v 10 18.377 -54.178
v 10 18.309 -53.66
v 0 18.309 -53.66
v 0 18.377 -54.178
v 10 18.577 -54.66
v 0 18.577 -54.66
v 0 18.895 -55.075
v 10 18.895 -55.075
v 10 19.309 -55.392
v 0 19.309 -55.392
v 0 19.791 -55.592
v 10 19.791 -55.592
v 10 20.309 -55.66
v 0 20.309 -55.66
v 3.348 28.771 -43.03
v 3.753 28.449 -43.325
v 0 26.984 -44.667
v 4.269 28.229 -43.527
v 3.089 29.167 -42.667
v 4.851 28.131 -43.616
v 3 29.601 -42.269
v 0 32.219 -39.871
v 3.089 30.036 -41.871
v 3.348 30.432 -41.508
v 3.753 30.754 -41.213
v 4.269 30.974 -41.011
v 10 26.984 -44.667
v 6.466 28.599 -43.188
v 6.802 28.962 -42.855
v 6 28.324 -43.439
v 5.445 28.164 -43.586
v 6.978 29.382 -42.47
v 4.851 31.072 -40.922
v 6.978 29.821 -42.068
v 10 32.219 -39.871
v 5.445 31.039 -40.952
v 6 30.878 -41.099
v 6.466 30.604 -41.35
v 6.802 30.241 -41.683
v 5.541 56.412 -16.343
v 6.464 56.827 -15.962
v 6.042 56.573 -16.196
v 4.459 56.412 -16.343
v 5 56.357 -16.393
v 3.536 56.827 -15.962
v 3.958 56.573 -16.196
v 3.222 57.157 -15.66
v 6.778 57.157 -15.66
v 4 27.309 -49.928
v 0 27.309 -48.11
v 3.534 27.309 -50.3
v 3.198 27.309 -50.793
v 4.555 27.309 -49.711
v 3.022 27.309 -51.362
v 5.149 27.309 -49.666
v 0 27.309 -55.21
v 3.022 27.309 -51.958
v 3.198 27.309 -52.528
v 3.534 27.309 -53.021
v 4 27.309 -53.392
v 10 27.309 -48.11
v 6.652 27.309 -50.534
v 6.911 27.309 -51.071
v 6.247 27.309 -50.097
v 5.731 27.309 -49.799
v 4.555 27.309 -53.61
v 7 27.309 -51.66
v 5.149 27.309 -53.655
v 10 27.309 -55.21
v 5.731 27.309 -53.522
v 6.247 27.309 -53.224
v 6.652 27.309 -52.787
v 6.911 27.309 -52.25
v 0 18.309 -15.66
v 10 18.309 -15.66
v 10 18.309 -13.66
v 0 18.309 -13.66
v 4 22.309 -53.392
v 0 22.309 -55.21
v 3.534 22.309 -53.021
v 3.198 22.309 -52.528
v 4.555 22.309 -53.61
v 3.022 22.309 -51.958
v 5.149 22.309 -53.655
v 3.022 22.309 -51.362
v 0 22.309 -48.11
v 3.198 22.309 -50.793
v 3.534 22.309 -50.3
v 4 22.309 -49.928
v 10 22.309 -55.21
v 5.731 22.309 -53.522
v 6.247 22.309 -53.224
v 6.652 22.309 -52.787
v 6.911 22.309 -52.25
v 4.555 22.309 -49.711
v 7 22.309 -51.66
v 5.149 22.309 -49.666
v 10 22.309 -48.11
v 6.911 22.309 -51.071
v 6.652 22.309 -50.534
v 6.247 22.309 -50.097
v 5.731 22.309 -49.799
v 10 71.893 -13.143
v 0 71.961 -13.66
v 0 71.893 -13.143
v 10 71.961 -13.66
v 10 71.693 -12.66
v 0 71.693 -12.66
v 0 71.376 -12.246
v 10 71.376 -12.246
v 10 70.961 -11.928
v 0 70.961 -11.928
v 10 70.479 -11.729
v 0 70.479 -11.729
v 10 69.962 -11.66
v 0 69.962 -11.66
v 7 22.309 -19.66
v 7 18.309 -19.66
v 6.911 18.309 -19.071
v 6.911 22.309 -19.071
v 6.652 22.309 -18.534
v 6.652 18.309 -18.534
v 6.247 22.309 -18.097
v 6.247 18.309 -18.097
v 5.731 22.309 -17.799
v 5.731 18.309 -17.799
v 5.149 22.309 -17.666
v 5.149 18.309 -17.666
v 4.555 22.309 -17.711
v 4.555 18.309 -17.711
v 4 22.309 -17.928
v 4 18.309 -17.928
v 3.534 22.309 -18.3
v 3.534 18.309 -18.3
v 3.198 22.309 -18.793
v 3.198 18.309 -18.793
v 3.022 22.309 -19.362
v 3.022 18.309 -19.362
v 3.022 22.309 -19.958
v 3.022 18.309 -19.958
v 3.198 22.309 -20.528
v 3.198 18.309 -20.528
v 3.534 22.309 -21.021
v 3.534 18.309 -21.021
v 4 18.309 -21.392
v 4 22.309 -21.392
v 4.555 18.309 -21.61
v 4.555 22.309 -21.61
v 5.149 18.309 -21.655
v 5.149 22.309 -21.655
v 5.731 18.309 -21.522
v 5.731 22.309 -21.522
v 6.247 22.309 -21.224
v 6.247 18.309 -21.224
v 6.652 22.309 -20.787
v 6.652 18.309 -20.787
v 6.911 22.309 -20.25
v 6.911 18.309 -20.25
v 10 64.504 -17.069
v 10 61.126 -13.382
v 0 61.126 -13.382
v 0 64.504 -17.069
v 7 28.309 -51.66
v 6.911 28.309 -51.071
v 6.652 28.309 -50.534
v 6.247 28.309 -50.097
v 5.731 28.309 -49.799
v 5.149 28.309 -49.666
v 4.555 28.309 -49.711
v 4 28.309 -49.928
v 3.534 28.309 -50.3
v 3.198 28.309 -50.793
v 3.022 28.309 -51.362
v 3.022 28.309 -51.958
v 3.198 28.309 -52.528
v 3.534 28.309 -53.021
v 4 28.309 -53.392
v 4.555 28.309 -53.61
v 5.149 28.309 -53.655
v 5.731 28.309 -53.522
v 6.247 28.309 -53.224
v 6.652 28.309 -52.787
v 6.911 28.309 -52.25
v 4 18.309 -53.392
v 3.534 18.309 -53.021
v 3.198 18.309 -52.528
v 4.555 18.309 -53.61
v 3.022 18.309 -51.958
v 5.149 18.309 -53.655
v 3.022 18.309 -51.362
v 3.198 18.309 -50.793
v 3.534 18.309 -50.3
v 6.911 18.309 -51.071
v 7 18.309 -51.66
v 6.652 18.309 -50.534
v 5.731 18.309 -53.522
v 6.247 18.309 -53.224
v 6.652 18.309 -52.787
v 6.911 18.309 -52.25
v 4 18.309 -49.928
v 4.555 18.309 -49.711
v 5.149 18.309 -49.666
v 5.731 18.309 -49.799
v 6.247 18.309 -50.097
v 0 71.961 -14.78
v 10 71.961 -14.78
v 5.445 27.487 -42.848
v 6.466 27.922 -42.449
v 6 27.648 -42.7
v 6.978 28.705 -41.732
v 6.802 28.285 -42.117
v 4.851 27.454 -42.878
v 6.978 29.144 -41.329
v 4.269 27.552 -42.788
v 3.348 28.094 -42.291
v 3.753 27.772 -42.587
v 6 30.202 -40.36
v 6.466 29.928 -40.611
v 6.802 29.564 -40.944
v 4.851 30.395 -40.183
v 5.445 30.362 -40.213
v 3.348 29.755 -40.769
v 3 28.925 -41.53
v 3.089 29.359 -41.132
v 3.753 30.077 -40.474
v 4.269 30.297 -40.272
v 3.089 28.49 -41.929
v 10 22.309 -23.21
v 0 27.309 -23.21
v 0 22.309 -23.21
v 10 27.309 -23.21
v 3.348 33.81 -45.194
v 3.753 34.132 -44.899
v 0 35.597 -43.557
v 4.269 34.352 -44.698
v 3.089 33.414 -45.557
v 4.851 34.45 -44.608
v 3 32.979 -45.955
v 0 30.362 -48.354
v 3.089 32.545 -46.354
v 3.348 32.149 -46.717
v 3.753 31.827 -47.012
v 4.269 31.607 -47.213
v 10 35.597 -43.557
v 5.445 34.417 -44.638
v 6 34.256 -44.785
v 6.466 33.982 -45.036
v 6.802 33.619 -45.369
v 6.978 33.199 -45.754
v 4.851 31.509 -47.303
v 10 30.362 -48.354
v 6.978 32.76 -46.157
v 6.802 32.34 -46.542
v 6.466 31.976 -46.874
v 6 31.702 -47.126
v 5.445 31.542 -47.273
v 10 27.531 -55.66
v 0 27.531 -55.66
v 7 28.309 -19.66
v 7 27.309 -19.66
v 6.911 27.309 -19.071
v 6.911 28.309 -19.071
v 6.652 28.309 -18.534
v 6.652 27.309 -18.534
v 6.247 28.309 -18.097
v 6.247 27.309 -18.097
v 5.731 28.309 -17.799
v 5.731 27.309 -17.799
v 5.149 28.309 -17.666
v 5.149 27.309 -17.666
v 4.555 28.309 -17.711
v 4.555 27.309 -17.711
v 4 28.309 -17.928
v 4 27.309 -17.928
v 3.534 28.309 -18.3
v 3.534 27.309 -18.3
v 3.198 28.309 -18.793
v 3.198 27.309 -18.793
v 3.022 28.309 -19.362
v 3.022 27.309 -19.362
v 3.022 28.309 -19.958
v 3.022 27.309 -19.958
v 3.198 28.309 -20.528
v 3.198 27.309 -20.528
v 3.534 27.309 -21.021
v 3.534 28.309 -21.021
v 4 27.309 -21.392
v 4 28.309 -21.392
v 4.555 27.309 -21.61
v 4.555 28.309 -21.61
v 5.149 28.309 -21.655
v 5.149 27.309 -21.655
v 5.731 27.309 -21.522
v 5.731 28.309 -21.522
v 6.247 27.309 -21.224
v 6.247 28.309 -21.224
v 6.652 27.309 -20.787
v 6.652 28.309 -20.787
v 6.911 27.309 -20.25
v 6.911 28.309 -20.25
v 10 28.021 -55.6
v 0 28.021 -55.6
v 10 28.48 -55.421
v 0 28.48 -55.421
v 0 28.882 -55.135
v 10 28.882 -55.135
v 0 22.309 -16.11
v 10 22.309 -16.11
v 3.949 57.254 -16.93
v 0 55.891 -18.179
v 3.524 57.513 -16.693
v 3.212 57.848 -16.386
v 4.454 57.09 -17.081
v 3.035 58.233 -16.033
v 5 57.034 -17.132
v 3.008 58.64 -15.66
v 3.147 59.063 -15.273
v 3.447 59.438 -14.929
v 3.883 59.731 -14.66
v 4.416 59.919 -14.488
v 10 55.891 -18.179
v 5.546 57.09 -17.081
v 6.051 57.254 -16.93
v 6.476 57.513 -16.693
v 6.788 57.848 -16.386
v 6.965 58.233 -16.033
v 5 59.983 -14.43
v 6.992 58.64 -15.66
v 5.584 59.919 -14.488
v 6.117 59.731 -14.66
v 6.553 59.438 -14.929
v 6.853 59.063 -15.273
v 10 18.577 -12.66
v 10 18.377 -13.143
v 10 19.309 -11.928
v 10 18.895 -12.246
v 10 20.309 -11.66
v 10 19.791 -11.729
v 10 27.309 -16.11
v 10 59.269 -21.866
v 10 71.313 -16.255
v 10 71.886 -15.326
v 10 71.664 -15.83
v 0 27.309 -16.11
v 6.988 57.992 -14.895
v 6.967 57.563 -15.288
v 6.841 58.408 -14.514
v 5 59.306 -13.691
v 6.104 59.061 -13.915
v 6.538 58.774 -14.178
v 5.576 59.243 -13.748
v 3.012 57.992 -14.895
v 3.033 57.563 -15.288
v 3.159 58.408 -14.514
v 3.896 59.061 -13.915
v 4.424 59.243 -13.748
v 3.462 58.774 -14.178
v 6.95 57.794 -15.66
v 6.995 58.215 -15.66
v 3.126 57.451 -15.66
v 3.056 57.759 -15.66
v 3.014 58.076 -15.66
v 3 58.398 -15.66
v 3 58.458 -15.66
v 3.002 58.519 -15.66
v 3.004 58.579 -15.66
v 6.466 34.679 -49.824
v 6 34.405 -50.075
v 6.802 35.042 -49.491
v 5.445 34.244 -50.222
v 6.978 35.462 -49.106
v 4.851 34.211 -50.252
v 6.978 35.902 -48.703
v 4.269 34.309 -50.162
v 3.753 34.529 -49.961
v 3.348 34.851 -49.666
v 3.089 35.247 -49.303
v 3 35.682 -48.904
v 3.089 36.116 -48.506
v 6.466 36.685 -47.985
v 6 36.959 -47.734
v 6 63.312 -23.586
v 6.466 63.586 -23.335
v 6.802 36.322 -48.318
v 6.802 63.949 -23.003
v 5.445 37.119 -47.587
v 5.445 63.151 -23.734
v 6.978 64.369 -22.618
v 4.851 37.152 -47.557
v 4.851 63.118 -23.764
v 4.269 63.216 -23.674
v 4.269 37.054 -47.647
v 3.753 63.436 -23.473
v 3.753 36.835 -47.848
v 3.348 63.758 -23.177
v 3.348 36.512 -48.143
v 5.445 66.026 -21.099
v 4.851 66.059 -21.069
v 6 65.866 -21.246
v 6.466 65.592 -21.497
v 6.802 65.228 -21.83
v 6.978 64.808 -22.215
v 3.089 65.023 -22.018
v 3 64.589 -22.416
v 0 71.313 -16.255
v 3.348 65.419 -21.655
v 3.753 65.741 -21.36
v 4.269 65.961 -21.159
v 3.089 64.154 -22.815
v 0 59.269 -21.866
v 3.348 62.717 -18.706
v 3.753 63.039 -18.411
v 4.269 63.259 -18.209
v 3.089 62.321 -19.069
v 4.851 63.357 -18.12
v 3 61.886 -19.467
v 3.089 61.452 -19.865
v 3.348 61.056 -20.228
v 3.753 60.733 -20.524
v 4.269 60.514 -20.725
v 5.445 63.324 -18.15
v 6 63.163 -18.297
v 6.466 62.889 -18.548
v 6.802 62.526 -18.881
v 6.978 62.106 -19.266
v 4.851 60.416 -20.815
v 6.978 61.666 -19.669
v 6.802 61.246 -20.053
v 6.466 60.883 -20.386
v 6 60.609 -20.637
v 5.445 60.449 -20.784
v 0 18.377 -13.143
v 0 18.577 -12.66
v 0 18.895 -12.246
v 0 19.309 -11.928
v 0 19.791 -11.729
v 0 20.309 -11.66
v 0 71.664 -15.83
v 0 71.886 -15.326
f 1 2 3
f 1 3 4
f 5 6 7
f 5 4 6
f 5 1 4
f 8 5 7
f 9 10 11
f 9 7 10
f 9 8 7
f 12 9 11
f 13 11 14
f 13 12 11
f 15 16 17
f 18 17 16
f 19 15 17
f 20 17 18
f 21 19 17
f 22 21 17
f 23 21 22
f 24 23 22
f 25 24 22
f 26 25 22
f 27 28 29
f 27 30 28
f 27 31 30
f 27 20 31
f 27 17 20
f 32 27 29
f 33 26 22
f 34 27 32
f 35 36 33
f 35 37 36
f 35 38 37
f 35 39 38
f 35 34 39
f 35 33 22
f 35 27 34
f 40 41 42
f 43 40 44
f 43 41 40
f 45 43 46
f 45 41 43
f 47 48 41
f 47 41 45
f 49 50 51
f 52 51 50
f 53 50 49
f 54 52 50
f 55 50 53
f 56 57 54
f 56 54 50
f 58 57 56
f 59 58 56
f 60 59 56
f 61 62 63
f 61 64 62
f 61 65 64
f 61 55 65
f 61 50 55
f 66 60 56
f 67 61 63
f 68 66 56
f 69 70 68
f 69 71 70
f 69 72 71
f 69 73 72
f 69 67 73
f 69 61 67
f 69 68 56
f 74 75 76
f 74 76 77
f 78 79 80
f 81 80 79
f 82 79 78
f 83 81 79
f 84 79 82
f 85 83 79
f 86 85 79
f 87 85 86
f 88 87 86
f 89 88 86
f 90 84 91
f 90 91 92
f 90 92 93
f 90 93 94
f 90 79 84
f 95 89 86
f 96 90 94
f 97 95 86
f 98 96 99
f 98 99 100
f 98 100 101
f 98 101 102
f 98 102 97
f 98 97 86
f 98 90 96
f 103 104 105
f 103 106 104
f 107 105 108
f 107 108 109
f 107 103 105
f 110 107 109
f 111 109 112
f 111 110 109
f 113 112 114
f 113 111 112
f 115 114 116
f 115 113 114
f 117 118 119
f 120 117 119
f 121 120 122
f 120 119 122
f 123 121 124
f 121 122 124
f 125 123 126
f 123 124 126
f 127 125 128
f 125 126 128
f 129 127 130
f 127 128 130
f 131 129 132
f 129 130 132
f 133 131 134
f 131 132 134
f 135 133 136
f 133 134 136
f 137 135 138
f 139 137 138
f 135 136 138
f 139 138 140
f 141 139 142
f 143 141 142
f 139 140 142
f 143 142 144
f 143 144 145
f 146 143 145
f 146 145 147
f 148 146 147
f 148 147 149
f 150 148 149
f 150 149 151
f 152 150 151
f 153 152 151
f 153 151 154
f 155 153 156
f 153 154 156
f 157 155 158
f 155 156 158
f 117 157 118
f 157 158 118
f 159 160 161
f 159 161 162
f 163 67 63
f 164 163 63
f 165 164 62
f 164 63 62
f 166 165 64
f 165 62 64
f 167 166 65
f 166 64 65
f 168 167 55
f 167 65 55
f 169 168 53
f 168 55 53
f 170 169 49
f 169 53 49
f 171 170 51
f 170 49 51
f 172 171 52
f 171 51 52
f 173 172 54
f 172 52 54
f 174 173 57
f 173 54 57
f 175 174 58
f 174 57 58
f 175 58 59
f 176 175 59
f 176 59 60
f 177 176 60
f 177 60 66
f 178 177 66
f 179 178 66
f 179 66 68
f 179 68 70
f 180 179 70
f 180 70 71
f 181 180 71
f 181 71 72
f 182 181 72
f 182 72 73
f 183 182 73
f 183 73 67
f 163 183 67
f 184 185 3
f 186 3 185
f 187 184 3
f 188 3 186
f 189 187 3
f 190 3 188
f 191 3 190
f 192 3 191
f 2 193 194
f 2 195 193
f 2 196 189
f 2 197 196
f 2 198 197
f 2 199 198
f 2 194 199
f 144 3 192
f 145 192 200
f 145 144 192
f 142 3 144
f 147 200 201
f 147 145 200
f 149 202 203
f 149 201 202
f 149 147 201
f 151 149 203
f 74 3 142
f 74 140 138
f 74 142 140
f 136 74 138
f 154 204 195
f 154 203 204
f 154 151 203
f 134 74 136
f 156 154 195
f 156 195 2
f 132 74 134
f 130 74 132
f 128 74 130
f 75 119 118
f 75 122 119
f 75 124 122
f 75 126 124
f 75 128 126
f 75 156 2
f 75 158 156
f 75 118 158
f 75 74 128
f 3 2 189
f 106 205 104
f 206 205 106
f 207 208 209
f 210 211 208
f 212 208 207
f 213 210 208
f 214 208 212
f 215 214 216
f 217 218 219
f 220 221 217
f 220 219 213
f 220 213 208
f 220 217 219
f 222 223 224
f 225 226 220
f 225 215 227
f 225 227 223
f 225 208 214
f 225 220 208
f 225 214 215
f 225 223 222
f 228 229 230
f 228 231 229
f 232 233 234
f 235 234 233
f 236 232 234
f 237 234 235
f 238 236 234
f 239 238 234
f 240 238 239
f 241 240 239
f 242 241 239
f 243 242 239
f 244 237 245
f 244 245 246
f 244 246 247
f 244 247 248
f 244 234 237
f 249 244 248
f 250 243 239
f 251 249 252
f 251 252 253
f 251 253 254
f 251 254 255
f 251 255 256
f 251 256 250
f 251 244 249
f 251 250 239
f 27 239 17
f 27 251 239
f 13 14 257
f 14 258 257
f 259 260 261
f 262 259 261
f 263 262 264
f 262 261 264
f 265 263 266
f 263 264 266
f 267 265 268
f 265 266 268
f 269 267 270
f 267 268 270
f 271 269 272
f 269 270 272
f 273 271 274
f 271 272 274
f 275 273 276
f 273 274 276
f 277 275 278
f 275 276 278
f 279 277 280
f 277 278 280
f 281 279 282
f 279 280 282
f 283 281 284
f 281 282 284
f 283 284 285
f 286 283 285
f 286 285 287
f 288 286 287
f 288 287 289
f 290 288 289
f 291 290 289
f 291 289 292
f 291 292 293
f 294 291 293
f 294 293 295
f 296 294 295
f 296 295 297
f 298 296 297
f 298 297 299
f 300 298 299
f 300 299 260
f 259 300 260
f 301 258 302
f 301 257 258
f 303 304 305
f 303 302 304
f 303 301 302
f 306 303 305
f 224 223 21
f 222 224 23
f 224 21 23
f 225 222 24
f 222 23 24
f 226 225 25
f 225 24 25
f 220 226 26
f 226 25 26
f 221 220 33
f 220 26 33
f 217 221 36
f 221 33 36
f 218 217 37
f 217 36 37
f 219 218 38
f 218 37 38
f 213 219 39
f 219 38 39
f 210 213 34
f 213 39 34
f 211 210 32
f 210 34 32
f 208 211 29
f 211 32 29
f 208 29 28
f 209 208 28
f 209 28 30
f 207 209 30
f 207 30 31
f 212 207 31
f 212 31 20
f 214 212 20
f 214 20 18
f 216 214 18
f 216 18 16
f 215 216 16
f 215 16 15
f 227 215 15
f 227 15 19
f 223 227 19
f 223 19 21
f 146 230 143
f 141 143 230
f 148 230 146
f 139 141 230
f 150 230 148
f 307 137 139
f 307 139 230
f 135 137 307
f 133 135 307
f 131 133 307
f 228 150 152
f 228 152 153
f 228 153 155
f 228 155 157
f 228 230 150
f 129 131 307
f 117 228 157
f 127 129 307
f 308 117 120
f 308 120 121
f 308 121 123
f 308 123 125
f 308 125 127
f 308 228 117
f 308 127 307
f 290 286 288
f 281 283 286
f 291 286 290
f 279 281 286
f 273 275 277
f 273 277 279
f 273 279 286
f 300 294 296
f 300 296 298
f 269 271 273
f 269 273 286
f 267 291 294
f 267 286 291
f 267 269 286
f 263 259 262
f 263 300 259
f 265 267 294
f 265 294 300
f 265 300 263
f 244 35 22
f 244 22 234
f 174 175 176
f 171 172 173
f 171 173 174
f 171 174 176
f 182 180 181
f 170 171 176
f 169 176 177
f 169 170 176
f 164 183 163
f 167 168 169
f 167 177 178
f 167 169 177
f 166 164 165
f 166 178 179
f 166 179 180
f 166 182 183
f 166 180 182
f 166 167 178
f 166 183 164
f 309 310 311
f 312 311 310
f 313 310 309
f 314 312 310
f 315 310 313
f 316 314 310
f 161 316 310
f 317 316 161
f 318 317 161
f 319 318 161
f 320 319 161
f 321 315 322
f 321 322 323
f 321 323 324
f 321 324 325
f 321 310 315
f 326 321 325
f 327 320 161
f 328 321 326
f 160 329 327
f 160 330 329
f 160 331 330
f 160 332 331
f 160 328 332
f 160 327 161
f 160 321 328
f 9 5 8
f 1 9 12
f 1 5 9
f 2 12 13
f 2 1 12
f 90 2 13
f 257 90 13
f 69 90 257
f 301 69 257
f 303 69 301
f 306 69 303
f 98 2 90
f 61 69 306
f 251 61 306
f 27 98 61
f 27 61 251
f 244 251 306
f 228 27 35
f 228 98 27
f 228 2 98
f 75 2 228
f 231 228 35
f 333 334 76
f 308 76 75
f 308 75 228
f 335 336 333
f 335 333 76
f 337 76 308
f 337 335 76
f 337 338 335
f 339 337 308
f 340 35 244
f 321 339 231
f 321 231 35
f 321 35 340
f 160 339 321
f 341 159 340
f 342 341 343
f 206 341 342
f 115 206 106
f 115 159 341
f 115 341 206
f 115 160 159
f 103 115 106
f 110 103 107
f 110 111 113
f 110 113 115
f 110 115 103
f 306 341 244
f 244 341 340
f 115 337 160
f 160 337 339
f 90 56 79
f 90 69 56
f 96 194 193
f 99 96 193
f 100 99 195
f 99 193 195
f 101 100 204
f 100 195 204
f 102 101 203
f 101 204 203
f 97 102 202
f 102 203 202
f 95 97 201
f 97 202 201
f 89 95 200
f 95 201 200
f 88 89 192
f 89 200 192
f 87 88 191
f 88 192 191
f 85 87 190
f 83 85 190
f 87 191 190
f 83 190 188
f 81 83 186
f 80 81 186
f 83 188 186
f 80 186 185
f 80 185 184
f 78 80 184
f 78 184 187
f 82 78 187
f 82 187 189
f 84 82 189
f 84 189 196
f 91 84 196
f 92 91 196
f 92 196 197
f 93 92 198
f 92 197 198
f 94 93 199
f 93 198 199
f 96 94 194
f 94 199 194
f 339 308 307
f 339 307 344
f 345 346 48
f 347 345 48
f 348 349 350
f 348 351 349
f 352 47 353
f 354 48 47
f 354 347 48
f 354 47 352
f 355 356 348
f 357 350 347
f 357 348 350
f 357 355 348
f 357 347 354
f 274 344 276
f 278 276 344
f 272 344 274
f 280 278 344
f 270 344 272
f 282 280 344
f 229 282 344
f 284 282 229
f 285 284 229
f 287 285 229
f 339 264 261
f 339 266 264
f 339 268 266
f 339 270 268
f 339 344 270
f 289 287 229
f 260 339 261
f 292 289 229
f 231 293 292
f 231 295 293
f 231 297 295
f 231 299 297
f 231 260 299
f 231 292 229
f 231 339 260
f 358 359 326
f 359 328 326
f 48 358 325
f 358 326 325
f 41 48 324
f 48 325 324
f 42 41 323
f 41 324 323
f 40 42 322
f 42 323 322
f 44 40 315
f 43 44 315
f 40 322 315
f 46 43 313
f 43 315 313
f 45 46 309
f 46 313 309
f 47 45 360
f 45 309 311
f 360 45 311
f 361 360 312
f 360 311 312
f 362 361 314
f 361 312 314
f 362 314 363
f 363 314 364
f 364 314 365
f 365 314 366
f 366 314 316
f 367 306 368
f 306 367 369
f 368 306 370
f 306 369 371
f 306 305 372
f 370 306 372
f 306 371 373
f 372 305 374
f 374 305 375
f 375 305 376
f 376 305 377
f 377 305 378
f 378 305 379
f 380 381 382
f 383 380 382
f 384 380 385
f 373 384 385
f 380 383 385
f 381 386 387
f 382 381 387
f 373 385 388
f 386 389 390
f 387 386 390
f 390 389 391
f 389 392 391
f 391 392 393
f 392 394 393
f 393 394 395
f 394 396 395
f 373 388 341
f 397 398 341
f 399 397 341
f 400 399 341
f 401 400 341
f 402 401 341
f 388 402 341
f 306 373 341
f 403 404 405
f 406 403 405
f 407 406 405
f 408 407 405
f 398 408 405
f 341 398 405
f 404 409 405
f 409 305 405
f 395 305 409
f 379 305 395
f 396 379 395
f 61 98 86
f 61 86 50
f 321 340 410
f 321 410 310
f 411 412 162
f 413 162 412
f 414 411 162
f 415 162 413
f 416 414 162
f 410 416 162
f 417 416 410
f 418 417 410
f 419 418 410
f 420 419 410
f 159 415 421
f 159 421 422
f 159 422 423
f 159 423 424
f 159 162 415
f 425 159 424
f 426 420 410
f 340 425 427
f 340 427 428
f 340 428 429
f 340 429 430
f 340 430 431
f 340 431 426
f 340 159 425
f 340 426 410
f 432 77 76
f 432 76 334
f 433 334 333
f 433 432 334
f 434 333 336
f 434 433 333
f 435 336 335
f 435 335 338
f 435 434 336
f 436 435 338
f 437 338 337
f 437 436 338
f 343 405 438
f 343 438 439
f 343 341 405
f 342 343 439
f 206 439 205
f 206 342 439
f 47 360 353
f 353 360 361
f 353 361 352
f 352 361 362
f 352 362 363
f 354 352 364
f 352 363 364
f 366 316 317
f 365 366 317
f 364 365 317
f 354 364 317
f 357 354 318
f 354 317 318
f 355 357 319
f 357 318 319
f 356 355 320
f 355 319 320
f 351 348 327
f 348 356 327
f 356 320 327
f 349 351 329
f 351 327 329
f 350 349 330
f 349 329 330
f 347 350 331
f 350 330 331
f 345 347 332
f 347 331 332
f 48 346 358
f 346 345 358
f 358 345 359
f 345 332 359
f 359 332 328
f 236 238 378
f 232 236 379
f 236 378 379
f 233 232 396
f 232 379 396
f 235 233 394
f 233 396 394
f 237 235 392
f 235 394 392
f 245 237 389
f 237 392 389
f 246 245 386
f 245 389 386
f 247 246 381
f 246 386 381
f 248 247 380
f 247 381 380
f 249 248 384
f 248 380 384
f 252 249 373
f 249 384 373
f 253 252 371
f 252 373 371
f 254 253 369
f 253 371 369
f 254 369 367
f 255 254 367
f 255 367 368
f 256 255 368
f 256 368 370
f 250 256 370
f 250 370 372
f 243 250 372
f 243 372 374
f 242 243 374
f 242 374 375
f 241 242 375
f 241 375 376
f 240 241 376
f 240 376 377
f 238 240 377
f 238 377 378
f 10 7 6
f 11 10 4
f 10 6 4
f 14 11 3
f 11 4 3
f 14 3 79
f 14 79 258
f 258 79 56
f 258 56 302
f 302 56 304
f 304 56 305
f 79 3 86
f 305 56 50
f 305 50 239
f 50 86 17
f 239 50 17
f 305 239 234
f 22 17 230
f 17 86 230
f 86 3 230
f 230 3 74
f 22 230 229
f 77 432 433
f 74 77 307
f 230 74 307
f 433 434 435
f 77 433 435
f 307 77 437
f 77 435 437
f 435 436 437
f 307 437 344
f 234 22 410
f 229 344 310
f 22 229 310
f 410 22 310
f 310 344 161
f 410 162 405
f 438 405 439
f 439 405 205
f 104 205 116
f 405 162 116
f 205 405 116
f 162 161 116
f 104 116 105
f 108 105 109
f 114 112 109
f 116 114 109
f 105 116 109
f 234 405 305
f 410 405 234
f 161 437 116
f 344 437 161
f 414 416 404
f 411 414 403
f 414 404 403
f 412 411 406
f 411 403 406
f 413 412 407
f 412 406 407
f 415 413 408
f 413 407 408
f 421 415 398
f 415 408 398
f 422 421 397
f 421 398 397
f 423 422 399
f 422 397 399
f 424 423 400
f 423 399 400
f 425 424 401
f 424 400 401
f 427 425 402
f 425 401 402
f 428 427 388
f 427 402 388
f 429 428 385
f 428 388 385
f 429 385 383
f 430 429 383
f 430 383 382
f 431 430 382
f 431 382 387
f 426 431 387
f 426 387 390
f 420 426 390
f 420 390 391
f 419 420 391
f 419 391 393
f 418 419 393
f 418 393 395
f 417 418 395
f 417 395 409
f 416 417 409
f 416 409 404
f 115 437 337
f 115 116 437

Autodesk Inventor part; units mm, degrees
ref_plane "YZ Plane" through (0, 0, 0) normal (1, 0, 0) x (0, 1, 0)
ref_plane "XZ Plane" through (0, 0, 0) normal (0, 1, 0) x (-1, 0, 0)
ref_plane "XY Plane" through (0, 0, 0) normal (0, 0, 1) x (1, 0, 0)
sketch "Sketch1" plane through (0, 0, 0) normal (1, 0, 0) x (0, 1, 0)
  line L0 (28.309, -15.6604) -> (71.9614, -15.6604)
  line L1 (28.309, -55.6604) -> (28.309, -15.6604)
  line L2 (28.309, -55.6604) -> (71.9614, -15.6604)
  point P0 (0, 0)
  dimension "d2" = 42.5
  dimension "d3" = 90
  dimension "d4" = 40
extrude "Extrusion1" add sketch "Sketch1" along normal blind 10
sketch "Sketch2" plane through (0, 28.309, -55.6604) normal (0, -1, 0) x (1, 0, 0)
  line L0 (0, 40) -> (0, 0) projected
  line L1 (0, 0) -> (10, 0) projected
  line L2 (10, 40) -> (10, 0) projected
  line L3 (0, 40) -> (10, 40) projected
  point P0 (0, 55.6604)
extrude "Extrusion2" add sketch "Sketch2" along normal blind 10
sketch "Sketch3" plane through (0, 18.309, -55.6604) normal (0, -1, 0) x (1, 0, 0)
  arc A0 (1, 4) -> (9, 4) centre (5, 4) ccw projected
  line L0 (9, 4) -> (9, 100) projected
  arc A1 (9, 100) -> (1, 100) centre (5, 100) ccw projected
  line L1 (1, 100) -> (1, 4) projected
  circle A2 centre (5, 100) radius 2 projected
  circle A3 centre (5, 92) radius 2 projected
  circle A4 centre (5, 84) radius 2 projected
  circle A5 centre (5, 76) radius 2 projected
  circle A6 centre (5, 68) radius 2 projected
  circle A7 centre (5, 60) radius 2 projected
  circle A8 centre (5, 52) radius 2 projected
  circle A9 centre (5, 44) radius 2 projected
  circle A10 centre (5, 36) radius 2 projected
  circle A11 centre (5, 28) radius 2 projected
  circle A12 centre (5, 20) radius 2 projected
  circle A13 centre (5, 12) radius 2 projected
  circle A14 centre (5, 4) radius 2 projected
  point P0 (0, 55.6604)
extrude "Extrusion3" cut sketch "Sketch3" against normal blind 10 contours A10 | A14
sketch "Sketch4" plane through (10, 71.9614, -15.6604) normal (0, 0.6755902, -0.7372773) x (-1, 0, 0)
  line L0 (10, -59.2075) -> (10, 0) projected
  line L1 (10, 0) -> (0, 0) projected
  line L2 (0, -59.2075) -> (0, 0) projected
  line L3 (10, -59.2075) -> (0, -59.2075) projected
  circle A0 centre (5, -10) radius 2
  circle A1 centre (5, -49.2075) radius 2
  point P0 (10, -42.4755)
  dimension "d11" = 4
  dimension "d12" = 4
  dimension "d13" = 10
  dimension "d14" = 10
extrude "Extrusion4" cut sketch "Sketch4" against normal blind 10 contours A0 | A1
sketch "Sketch5" plane through (10, 0, 0) normal (1, 0, 0) x (0, 0, -1)
  line L0 (53.6604, 18.309) -> (53.6604, 28.309) projected
  line L1 (49.6604, 18.309) -> (49.6604, 28.309) projected
  line L2 (21.6604, 18.309) -> (21.6604, 28.309) projected
  line L3 (17.6604, 18.309) -> (17.6604, 28.309) projected
  line L4 (16.1104, 27.309) -> (23.2104, 27.309)
  line L5 (23.2104, 27.309) -> (23.2104, 22.309)
  line L6 (23.2104, 22.309) -> (16.1104, 22.309)
  line L7 (16.1104, 22.309) -> (16.1104, 27.309)
  line L8 (55.6604, 18.309) -> (15.6604, 18.309) projected
  line L9 (48.1104, 27.309) -> (55.2104, 27.309)
  line L10 (55.2104, 27.309) -> (55.2104, 22.309)
  line L11 (55.2104, 22.309) -> (48.1104, 22.309)
  line L12 (48.1104, 22.309) -> (48.1104, 27.309)
  line L13 (23.7675, 63.114) -> (16.3947, 56.3581) projected
  line L14 (21.0651, 66.0632) -> (15.6604, 61.1106) projected
  line L15 (50.2557, 34.2073) -> (42.8829, 27.4514) projected
  line L16 (47.5533, 37.1564) -> (40.1805, 30.4005) projected
  line L17 (17.0688, 64.5036) -> (21.8655, 59.2689)
  line L18 (21.8655, 59.2689) -> (18.1791, 55.891)
  line L19 (18.1791, 55.891) -> (13.3824, 61.1256)
  line L20 (13.3824, 61.1256) -> (17.0688, 64.5036)
  line L21 (55.6604, 28.309) -> (15.6604, 71.9614) projected
  line L22 (15.6604, 71.9614) -> (15.6604, 18.309) projected
  line L23 (43.557, 35.5968) -> (48.3537, 30.3621)
  line L24 (48.3537, 30.3621) -> (44.6673, 26.9842)
  line L25 (44.6673, 26.9842) -> (39.8706, 32.2188)
  line L26 (39.8706, 32.2188) -> (43.557, 35.5968)
  point P0 (0, 0)
  dimension "d17" = 7.1
  dimension "d18" = 5
  dimension "d19" = 4
  dimension "d20" = 1.55
  dimension "d21" = 4
  dimension "d22" = 7.1
  dimension "d23" = 5
  dimension "d24" = 4
  dimension "d25" = 1.55
  dimension "d28" = 7.1
  dimension "d29" = 5
  dimension "d30" = 1.55
  dimension "d31" = 4
  dimension "d33" = 7.1
  dimension "d34" = 5
  dimension "d35" = 4
  dimension "d36" = 1.55
sketch "Sketch6" plane through (0, 71.9614, -15.6604) normal (0, 0, 1) x (1, 0, 0)
  ellipse E0 centre (5, -13.5634) end of major axis (5, -16.2761) minor radius 2 (6.7794, -14.8019) -> (3.2206, -14.8019) ccw projected
  line L0 (6.7794, -14.8019) -> (3.2206, -14.8019) projected
  line L1 (0, 0) -> (0, -53.6523) projected
  line L2 (10, -53.6523) -> (0, -53.6523) projected
  line L3 (10, 0) -> (10, -53.6523) projected
  line L4 (0, 0) -> (10, 0) projected
  point P0 (0, -71.9614)
extrude "Extrusion6" add sketch "Sketch6" along normal blind 4 contours L0 E0 | L4 L3 L2 L1
sketch "Sketch7" plane through (10, 28.309, -55.6604) normal (0, 0.6755902, -0.7372773) x (-1, 0, 0)
  circle A0 centre (5, 10) radius 2 projected
  circle A1 centre (5, 49.2075) radius 2 projected
  line L0 (10, 0) -> (10, 59.2075) projected
  line L1 (10, 59.2075) -> (0, 59.2075) projected
  line L2 (0, 0) -> (0, 59.2075) projected
  line L3 (10, 0) -> (0, 0) projected
  point P0 (10, 16.732)
extrude "Extrusion7" cut sketch "Sketch7" against normal blind 10 contours A1
extrude "Extrusion8" cut sketch "Sketch5" against normal blind 10 contours L11 L1 L9 L0 | L0 L9 L10 L11 | L11 L12 L9 L1 | L6 L3 L4 L2 | L2 L4 L5 L6 | L6 L7 L4 L3 | L17 L18 L19 L13 | L13 L19 L22 L14 L17 | L14 L22 L20 L17 | L19 L20 L22 | L23 L24 L25 L15 | L15 L25 L16 L23 | L16 L25 L26 L23
fillet "Fillet1" radius 2 5 edges at (5, 71.9614, -11.6604) (5, 71.9614, -15.6604) (5, 18.309, -11.6604) (5, 18.309, -55.6604) (5, 28.309, -55.6604)
sketch "Sketch8" plane through (10, 28.8825, -55.1349) normal (0, 0.6755902, -0.7372773) x (-1, 0, 0)
  line L0 (10, 0) -> (0, 0) projected
  line L1 (10, 0) -> (10, 57.5497) projected
  line L2 (0, 57.5497) -> (10, 57.5497) projected
  line L3 (0, 0) -> (0, 57.5497) projected
  circle A0 centre (5, 48.4297) radius 2 projected
  circle A1 centre (5, 9.2222) radius 2 projected
  line L4 (0, 60.3064) -> (10, 60.3064) projected
  line L5 (10, -7.3248) -> (0, -7.3248) projected
  line L6 (0, 60.3064) -> (10, 60.3064)
  line L7 (10, 60.3064) -> (10, -7.3248)
  line L8 (10, -7.3248) -> (0, -7.3248)
  line L9 (0, -7.3248) -> (0, 60.3064)
  line L10 (0, -1.3512) -> (10, -1.3512) projected
  point P0 (10, 15.9542)
  dimension "d44" = 10
  dimension "d45" = 4
  dimension "d46" = 9.8766
  dimension "d47" = 61.6575
  dimension "d48" = 39.2075
equation "\"d14\" = d13"
equation "\"d20\" = -0.5 * d19 + 0.5 * d17"
equation "\"d24\" = d21"
equation "\"d25\" = d20"
equation "\"d28\" = d17"
equation "\"d29\" = d18"
equation "\"d30\" = d20"
equation "\"d31\" = d21"
equation "\"d35\" = d21"
equation "\"d36\" = d20"
properties part number "intake plate holder"
